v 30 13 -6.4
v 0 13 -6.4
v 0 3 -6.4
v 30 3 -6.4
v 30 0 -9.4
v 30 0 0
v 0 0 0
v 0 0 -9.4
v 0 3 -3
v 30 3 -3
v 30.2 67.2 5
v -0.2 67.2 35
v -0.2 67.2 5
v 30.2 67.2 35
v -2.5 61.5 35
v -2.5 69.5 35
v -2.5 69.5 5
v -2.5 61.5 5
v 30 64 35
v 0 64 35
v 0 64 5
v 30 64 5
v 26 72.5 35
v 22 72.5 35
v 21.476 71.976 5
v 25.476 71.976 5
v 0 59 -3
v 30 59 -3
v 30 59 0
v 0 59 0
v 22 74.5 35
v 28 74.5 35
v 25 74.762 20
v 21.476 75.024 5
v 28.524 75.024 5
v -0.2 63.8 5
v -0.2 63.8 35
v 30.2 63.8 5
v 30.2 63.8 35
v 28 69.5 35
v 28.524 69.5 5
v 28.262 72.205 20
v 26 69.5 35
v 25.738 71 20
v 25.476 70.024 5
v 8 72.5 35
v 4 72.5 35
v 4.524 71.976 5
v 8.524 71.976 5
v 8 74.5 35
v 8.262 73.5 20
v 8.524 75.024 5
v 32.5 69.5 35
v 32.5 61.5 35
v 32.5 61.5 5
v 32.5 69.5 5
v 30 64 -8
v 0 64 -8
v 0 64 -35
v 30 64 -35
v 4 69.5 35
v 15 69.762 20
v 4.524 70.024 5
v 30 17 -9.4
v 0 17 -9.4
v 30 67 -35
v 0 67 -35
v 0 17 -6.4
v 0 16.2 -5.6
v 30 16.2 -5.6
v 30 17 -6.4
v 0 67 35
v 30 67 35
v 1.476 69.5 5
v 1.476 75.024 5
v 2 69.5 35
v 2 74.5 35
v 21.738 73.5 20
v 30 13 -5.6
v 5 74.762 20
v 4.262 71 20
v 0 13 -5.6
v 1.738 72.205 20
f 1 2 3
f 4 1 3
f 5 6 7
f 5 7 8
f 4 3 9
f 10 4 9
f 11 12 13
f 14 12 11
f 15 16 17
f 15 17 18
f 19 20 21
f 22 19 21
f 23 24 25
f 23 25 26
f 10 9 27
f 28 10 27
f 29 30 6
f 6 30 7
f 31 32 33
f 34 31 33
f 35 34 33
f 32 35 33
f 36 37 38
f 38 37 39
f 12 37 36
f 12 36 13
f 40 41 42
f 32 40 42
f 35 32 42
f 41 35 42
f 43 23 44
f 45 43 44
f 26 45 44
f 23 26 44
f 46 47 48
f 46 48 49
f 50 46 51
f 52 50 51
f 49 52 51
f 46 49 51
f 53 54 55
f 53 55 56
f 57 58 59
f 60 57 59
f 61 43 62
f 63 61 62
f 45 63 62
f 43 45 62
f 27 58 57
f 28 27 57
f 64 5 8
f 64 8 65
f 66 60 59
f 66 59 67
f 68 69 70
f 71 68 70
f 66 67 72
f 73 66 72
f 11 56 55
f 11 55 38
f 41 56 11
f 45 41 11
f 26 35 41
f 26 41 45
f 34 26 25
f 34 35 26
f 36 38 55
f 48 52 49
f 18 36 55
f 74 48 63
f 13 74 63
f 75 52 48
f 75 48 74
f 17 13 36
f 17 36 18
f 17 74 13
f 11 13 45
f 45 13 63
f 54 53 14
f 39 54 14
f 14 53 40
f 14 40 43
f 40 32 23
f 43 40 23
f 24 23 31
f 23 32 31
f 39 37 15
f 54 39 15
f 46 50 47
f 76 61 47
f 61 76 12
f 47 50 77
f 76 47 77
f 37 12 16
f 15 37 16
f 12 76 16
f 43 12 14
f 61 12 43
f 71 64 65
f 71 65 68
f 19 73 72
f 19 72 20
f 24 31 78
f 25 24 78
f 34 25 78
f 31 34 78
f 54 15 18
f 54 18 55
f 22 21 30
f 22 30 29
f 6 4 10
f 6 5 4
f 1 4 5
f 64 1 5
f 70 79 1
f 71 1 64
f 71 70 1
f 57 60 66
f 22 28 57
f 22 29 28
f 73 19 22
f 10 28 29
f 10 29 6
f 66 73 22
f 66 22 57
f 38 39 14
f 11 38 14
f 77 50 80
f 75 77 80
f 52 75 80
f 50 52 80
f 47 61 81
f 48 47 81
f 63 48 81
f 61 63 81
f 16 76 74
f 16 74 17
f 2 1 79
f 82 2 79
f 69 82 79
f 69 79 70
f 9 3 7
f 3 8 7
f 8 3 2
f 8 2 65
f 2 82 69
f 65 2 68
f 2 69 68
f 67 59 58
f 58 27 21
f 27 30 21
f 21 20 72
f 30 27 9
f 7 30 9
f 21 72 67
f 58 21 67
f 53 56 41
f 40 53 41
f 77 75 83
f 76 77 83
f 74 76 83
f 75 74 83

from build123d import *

# Parameters (mm, degrees)
F0_W     = 5
F0_H     = 5
F0_W_2   = 4
F0_H_2   = 0.8
F1_DEPTH = 30
F3_W     = 30.4
F3_H     = 3.4
F4_DEPTH = 30
F5_SIZE  = 0.8
F6_SIZE  = 4.99999
F3_W_2   = 2
F3_H_2   = 3
F7_DEPTH = 30
F7_TAPER = -1


# Not quite as in the source:
# - a fillet or chamfer is up to 0.001 mm smaller than in the source, because OpenCascade refuses the exact size


with BuildPart() as f1:
    # F0 (on Right) → F1 (new body)
    with BuildSketch(Plane.YZ):
        Polygon((59, 0), (0, 0), (0, -3), (3, -3), (59, -3), (64, -3), (64, 0), align=None)
        with Locations((61.5, 2.5)):
            Rectangle(F0_W, F0_H)
        Polygon((3, -3), (0, -3), (0, -9.4), (3, -9.4), (3, -6.4), align=None)
        Polygon((67, 0), (64, 0), (64, -3), (64, -8), (64, -35), (67, -35), align=None)
        Polygon((64, 5), (64, 0), (67, 0), (67, 35), (64, 35), align=None)
        with Locations((61.5, -5.5)):
            Rectangle(F0_W, F0_H)
        Polygon((13, -6.4), (3, -6.4), (3, -9.4), (17, -9.4), (17, -6.4), align=None)
        with Locations((15, -6)):
            Rectangle(F0_W_2, F0_H_2)
    extrude(amount=F1_DEPTH)

    # F5
    f5_edges = [f1.edges().sort_by_distance(p)[0] for p in [
        (15, 17, -5.6),
    ]]
    chamfer(f5_edges, length=F5_SIZE)

    # F6 (size 5 in the source; OpenCascade refuses exactly that, so slightly less here)
    f6_edges = [f1.edges().sort_by_distance(p)[0] for p in [
        (15, 59, 5),
        (15, 59, -8),
    ]]
    chamfer(f6_edges, length=F6_SIZE)


with BuildPart() as f4:
    # F3 (on offset) → F4 (new body)
    with BuildSketch(Plane.XY.offset(35)):
        Polygon((2, 69.5), (-2.5, 69.5), (-2.5, 61.5), (32.5, 61.5), (32.5, 69.5), (28, 69.5), (28, 68.5), (2, 68.5), align=None)
        with Locations((15, 65.5)):
            Rectangle(F3_W, F3_H, mode=Mode.SUBTRACT)
        Polygon((4, 69.5), (2, 69.5), (2, 68.5), (28, 68.5), (28, 69.5), (26, 69.5), align=None)
    extrude(amount=-F4_DEPTH)

    # F3 (on offset) → F7 (join)
    with BuildSketch(Plane.XY.offset(35)):
        Polygon((22, 72.5), (26, 72.5), (28, 72.5), (28, 74.5), (22, 74.5), align=None)
        with Locations((27, 71)):
            Rectangle(F3_W_2, F3_H_2)
        Polygon((4, 69.5), (2, 69.5), (2, 68.5), (28, 68.5), (28, 69.5), (26, 69.5), align=None)
        Polygon((2, 74.5), (2, 72.5), (4, 72.5), (8, 72.5), (8, 74.5), align=None)
        with Locations((3, 71)):
            Rectangle(F3_W_2, F3_H_2)
    extrude(amount=-F7_DEPTH, taper=F7_TAPER)


solid = Compound([f1.part, f4.part])
